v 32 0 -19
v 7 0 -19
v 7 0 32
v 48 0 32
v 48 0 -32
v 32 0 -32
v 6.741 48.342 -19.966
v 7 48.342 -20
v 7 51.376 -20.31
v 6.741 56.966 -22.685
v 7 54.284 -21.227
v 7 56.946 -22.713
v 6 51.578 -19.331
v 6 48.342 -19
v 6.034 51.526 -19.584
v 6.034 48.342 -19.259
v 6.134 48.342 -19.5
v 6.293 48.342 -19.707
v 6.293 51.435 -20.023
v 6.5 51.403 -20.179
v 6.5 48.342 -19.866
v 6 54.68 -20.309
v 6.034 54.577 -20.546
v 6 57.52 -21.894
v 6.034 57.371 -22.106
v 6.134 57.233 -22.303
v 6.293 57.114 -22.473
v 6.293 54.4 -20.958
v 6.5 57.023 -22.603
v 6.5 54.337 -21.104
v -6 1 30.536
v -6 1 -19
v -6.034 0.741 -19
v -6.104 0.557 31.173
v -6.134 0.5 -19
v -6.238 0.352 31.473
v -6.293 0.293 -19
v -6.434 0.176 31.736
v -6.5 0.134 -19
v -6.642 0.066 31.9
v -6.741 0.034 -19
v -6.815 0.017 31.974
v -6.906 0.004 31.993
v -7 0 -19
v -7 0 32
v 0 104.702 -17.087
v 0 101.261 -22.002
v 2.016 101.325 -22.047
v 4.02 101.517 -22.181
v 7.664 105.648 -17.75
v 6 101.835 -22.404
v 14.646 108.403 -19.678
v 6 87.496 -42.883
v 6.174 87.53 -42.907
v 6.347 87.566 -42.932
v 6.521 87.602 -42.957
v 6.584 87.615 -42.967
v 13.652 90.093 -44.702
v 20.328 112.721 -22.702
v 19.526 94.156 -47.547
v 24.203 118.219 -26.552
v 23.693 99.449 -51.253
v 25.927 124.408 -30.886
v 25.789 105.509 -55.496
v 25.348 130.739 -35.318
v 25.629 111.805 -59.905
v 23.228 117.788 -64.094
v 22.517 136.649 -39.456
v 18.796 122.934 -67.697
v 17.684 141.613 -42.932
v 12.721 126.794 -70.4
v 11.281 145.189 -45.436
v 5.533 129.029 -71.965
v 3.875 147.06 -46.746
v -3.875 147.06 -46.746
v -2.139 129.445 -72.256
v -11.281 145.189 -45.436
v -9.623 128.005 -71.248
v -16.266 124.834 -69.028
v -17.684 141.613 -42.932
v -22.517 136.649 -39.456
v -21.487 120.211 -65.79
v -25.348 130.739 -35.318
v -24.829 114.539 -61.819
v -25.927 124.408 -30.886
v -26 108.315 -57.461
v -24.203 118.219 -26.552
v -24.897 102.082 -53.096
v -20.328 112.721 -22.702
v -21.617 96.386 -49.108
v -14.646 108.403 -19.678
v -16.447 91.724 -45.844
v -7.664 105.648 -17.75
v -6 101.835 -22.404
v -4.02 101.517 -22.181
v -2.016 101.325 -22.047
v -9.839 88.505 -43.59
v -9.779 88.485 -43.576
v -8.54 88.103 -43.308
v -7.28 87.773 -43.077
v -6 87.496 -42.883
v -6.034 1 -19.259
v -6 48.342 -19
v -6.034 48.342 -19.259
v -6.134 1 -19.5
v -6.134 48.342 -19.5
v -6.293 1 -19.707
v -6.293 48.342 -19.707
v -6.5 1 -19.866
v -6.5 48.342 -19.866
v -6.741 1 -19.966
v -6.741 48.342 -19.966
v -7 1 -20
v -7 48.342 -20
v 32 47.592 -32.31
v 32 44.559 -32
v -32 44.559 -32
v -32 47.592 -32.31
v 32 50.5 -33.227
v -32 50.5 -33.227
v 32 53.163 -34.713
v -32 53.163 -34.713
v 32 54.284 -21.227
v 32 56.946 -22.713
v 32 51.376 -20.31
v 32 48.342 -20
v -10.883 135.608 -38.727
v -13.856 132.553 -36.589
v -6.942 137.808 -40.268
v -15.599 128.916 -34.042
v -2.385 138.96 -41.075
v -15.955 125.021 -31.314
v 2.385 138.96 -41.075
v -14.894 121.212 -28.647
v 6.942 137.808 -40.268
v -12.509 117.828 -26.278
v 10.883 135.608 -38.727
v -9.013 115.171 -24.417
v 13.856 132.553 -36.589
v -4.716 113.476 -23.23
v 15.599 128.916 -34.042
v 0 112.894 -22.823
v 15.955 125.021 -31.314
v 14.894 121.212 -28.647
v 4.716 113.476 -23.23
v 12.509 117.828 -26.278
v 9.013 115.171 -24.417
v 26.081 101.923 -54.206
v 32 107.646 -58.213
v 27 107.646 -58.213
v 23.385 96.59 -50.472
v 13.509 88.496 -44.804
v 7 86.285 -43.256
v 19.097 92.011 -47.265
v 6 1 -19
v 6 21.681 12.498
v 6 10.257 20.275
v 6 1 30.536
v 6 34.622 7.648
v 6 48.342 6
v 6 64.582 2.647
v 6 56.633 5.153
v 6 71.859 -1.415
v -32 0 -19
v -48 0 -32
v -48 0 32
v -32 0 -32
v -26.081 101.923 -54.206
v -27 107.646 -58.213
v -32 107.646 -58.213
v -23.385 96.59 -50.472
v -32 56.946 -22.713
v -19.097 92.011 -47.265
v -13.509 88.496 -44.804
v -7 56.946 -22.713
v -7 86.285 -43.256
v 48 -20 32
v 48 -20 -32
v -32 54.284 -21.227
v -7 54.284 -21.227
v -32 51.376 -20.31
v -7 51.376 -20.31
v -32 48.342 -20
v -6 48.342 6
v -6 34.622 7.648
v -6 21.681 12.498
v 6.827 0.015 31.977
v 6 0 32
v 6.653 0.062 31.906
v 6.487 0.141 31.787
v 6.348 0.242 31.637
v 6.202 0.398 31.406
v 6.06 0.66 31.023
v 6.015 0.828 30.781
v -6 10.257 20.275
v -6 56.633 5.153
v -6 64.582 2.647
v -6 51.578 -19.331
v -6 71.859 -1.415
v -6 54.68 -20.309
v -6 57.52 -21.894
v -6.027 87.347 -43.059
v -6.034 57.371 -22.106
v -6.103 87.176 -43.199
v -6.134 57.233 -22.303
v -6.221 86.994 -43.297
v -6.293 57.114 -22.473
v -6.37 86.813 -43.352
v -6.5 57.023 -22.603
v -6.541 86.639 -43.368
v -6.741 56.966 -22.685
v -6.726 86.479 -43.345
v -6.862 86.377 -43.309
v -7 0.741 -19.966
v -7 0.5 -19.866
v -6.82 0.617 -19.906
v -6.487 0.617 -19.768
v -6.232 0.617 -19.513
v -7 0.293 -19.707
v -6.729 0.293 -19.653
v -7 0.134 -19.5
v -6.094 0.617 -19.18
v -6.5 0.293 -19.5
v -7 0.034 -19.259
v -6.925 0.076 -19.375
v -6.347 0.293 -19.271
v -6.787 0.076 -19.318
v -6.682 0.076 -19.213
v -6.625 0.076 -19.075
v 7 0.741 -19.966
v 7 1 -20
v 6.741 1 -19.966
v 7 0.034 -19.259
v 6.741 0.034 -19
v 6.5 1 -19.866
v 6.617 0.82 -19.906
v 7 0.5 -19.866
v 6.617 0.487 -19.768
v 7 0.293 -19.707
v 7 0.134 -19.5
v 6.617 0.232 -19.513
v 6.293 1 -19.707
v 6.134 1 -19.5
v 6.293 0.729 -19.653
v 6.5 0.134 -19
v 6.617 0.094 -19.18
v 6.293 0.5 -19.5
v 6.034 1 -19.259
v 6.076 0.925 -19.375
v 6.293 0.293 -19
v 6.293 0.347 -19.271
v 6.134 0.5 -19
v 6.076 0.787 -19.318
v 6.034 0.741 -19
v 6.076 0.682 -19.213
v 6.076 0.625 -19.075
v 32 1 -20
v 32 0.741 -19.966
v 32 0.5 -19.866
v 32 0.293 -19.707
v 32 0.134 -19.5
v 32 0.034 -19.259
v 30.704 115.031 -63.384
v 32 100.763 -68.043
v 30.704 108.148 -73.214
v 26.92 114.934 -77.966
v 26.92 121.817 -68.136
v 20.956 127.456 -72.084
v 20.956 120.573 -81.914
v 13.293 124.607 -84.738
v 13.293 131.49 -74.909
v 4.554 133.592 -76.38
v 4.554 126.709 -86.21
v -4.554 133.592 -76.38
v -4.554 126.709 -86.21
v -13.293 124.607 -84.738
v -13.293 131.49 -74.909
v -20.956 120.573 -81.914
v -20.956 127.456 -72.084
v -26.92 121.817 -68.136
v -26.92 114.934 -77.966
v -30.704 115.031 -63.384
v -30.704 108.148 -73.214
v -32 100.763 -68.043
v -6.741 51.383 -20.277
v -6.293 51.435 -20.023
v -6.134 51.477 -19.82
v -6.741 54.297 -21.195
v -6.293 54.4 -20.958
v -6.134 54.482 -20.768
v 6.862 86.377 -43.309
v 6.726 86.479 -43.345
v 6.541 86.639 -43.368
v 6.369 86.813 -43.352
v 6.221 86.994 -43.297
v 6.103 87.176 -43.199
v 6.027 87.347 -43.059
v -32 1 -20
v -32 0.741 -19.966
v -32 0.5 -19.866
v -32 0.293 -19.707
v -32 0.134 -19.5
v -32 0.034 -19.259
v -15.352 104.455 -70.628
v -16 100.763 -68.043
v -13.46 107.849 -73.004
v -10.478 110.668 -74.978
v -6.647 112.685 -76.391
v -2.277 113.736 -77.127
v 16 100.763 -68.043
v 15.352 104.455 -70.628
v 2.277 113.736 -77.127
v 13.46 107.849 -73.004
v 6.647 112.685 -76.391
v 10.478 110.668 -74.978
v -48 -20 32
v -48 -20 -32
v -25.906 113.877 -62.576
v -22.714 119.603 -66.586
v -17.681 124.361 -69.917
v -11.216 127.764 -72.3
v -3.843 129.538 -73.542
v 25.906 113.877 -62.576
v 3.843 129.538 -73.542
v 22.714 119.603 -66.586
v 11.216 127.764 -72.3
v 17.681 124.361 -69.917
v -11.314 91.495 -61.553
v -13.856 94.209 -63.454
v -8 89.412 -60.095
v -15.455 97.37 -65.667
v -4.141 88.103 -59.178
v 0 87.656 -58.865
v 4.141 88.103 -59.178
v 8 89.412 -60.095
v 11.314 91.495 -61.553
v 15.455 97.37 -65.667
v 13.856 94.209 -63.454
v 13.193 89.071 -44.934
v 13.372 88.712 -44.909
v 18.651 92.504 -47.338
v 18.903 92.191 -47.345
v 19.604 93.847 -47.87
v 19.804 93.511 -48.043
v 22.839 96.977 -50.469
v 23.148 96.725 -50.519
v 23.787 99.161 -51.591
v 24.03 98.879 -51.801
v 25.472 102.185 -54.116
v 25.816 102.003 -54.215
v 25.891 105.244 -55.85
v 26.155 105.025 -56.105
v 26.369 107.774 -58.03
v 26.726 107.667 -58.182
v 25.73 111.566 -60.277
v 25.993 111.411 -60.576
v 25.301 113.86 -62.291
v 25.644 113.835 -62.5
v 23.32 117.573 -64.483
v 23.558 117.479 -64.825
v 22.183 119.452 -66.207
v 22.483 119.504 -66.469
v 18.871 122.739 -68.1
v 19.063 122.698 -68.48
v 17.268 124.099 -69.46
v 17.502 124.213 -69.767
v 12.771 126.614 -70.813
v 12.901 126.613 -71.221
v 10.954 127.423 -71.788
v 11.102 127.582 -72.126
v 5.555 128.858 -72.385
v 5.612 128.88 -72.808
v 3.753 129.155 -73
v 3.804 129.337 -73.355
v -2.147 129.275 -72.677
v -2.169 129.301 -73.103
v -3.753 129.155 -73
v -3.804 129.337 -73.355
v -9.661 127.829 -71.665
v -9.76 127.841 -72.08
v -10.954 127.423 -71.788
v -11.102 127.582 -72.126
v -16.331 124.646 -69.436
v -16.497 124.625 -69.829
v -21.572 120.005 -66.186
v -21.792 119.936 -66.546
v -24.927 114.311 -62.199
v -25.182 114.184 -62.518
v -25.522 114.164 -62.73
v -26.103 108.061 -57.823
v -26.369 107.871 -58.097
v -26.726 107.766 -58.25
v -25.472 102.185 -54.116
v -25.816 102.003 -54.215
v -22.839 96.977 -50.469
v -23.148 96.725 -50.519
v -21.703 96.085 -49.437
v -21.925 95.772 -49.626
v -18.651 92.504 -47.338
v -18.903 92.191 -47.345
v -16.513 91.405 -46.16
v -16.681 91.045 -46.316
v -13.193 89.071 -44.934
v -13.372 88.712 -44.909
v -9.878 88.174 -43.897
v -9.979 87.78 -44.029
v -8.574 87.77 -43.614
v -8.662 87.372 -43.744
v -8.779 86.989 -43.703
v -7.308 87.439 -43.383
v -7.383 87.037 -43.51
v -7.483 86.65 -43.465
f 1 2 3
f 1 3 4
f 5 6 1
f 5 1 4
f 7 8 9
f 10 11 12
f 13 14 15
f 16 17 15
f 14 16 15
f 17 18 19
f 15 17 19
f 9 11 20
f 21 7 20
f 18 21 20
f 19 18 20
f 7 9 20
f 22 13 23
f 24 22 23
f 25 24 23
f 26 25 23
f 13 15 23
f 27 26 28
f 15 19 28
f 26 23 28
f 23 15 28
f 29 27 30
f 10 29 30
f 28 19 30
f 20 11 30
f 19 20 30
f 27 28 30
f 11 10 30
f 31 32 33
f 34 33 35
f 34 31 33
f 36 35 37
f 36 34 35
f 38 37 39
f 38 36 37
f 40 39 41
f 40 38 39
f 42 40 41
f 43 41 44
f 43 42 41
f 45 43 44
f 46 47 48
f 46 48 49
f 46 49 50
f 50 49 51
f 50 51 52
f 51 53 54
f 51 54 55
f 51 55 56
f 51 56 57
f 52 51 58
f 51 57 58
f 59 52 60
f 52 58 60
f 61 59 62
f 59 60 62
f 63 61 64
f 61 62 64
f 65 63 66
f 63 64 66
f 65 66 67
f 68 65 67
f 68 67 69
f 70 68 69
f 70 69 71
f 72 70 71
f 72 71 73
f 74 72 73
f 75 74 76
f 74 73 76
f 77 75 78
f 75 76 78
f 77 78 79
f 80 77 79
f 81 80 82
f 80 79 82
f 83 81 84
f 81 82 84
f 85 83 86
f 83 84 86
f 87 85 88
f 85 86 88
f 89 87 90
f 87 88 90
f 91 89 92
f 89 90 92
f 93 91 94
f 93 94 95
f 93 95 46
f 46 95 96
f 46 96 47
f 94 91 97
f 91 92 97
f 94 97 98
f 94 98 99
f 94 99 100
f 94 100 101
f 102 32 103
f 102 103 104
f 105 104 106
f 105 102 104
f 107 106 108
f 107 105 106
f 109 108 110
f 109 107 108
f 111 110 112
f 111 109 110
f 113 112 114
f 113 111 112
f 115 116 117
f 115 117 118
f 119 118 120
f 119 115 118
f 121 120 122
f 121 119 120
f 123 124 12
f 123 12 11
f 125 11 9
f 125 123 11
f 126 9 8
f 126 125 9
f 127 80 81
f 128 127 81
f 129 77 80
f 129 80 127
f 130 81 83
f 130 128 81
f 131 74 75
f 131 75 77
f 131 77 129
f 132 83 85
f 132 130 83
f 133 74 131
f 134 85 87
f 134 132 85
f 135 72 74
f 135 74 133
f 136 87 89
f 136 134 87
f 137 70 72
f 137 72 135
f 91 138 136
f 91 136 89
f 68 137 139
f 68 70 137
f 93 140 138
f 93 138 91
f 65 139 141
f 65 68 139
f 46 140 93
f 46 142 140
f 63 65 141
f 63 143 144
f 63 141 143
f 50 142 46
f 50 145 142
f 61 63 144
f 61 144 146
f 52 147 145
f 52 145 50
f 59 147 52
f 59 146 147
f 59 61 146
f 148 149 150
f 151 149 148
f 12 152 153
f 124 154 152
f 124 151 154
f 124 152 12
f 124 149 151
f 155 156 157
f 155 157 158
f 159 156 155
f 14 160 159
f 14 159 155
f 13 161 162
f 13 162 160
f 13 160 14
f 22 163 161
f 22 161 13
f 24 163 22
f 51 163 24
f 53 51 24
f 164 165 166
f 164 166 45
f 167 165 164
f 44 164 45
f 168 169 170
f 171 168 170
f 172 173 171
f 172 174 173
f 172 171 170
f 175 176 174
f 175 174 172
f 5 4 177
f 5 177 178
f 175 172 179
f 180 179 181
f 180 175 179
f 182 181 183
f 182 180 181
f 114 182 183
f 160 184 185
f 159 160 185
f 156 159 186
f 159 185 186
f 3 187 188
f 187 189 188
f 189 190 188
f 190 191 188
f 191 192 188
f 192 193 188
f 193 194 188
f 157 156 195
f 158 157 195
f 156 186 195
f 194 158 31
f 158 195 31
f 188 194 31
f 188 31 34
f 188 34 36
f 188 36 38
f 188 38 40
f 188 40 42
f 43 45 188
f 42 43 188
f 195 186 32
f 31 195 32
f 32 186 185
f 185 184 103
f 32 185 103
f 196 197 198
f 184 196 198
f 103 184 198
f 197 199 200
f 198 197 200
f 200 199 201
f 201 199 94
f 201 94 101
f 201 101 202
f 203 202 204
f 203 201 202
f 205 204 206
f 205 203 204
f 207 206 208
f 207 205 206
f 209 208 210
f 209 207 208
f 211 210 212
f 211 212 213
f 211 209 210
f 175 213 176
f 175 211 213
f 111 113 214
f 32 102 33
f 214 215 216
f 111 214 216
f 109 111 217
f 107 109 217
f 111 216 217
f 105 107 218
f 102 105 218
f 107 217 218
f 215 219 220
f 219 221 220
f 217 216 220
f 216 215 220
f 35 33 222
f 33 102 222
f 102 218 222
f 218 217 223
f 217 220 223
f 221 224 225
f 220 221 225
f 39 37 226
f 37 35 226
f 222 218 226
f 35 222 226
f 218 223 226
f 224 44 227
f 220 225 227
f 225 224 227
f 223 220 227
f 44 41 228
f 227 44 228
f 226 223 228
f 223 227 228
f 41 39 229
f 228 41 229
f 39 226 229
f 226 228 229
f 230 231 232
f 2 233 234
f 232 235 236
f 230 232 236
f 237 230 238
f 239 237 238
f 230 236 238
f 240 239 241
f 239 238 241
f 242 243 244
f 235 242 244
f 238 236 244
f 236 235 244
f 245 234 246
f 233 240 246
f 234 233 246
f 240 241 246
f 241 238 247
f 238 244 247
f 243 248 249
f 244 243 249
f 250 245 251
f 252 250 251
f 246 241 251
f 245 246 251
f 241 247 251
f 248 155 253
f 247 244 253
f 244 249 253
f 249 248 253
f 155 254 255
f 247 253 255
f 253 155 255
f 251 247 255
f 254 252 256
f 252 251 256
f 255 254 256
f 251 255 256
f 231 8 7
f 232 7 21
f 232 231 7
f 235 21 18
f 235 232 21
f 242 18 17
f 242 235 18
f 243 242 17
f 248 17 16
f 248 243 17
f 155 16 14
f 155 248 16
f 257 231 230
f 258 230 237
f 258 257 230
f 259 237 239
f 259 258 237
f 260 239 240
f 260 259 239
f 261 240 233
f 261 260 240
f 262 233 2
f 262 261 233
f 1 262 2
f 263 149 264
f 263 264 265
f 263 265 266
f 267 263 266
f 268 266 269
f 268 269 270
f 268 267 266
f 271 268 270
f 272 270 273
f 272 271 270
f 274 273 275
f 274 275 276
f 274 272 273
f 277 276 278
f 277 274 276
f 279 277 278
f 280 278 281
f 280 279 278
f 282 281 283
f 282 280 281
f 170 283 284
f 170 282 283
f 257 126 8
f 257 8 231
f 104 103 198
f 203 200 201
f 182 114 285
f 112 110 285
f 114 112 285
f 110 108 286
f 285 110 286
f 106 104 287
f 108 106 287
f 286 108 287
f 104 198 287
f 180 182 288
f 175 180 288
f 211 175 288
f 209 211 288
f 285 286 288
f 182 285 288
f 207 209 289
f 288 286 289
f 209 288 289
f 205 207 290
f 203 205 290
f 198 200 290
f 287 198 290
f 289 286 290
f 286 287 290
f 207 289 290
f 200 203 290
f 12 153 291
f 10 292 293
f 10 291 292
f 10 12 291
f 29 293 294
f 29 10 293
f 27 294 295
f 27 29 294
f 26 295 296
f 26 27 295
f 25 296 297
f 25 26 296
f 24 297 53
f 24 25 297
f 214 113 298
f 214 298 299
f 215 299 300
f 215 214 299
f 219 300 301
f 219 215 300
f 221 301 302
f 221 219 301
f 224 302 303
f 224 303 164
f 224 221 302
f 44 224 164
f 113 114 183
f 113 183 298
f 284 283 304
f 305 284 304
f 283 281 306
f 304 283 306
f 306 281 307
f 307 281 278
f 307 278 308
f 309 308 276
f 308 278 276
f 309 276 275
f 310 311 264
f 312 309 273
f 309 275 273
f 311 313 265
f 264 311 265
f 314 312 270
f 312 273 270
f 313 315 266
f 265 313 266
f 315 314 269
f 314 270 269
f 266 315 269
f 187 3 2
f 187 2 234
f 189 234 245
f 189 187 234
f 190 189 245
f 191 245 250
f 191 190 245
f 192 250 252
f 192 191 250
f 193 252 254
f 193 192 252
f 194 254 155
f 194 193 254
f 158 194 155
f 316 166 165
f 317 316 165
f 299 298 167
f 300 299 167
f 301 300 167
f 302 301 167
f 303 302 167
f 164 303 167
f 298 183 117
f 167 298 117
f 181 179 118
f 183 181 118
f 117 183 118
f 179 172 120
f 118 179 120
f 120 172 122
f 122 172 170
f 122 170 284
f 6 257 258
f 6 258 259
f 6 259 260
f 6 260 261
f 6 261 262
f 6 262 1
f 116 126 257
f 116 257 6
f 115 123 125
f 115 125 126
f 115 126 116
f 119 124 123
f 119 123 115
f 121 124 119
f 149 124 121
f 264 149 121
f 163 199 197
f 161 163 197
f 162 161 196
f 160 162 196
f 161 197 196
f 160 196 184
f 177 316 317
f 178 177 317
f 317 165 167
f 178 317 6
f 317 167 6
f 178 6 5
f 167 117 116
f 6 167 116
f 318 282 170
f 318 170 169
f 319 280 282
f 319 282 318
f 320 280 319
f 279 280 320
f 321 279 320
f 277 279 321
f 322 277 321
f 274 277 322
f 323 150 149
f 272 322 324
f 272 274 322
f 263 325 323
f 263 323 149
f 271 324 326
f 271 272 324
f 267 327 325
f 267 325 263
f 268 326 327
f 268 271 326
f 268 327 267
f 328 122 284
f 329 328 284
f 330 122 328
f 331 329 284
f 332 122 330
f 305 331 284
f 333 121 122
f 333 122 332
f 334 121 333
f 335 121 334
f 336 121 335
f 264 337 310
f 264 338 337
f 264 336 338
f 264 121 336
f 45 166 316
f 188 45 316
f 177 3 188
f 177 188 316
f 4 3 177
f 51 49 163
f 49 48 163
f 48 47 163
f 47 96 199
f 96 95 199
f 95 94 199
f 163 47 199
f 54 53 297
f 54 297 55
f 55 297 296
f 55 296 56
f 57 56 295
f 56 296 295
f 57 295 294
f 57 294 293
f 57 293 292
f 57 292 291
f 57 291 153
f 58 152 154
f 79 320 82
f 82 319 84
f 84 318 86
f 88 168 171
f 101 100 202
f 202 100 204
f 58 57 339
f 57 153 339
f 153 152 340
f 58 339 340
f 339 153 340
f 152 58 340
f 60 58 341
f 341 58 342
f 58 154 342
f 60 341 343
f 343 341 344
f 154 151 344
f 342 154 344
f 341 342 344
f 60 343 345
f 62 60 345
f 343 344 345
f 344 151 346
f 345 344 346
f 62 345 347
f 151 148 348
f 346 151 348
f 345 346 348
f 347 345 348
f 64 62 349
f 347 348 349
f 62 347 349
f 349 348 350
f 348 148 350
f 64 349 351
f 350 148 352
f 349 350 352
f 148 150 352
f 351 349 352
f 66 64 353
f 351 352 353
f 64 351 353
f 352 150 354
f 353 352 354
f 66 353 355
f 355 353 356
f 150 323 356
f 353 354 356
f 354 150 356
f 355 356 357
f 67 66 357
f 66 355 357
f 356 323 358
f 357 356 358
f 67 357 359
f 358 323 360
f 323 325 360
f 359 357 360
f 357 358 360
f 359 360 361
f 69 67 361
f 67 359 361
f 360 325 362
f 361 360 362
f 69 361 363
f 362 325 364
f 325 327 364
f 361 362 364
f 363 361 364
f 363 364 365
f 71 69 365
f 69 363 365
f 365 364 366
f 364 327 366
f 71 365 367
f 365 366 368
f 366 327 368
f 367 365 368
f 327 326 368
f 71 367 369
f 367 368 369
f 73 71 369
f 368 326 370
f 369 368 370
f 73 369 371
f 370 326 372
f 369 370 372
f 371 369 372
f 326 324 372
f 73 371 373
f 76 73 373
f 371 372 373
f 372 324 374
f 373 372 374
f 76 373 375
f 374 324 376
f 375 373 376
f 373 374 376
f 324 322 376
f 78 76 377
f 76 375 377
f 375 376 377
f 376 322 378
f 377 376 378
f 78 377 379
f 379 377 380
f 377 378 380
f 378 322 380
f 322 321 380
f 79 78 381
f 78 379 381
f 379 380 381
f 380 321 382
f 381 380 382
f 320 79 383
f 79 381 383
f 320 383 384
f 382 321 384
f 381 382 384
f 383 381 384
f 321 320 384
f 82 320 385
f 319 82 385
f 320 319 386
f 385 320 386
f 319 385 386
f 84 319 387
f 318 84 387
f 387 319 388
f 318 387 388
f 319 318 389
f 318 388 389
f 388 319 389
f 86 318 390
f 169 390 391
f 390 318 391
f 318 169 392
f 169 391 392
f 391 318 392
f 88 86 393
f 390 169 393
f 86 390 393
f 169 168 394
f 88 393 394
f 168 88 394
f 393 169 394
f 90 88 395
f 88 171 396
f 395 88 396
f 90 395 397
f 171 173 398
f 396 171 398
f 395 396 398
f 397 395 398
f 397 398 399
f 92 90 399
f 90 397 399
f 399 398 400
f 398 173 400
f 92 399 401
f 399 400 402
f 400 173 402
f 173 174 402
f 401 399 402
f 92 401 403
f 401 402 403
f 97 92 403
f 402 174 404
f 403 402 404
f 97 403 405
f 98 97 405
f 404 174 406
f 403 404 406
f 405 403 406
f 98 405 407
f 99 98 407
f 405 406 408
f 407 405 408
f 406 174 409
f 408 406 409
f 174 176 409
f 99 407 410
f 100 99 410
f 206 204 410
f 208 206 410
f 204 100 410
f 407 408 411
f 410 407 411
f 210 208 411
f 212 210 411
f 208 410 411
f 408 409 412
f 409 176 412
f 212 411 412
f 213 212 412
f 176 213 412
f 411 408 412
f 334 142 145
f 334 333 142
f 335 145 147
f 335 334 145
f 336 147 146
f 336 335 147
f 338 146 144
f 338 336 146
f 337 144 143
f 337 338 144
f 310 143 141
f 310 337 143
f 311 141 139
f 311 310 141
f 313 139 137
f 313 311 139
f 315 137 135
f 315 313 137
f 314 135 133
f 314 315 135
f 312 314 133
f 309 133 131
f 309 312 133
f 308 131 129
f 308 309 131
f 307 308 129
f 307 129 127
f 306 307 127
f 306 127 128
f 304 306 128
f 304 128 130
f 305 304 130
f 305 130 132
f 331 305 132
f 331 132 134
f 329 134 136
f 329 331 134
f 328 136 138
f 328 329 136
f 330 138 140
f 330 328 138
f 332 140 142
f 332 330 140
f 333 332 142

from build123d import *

# Parameters (mm, degrees)
SKETCH1_W               = 96
SKETCH1_H               = 64
BOSS_EXTRUDE1_DEPTH     = 20
BOSS_EXTRUDE2_DEPTH     = 32
BOSS_EXTRUDE3_DEPTH     = 12
SKETCH8_R               = 26
SKETCH8_R_2             = 16
BOSS_EXTRUDE4_DEPTH     = 32
CUT_EXTRUDE1_DEPTH      = 177.853582377
CUT_EXTRUDE1_DEPTH_BACK = 177.853582377
SKETCH9_R               = 16
RIB9_START              = -6
RIB9_DEPTH              = 12
FILLET1_R               = 1


with BuildPart() as part:
    # Sketch1 → Boss-Extrude1 (new body)
    with BuildSketch(Plane(origin=(0, 0, 0), x_dir=(1, 0, 0), z_dir=(0, 1, 0))):
        Rectangle(SKETCH1_W, SKETCH1_H)
    extrude(amount=-BOSS_EXTRUDE1_DEPTH)

    # Sketch4 → Boss-Extrude2 (add, symmetric)
    with BuildSketch(Plane(origin=(0, 0, 0), x_dir=(0, 0, -1), z_dir=(1, 0, 0))):
        with BuildLine():
            Line((20, -20), (32, -20))
            Line((32, -20), (32, 44.558859159))
            ThreePointArc((32, 44.558859159), (32.694245739, 49.069446152), (34.712719336, 53.162505705))
            Line((34.712719336, 53.162505705), (68.042689949, 100.762636801))
            Line((68.042689949, 100.762636801), (58.212865417, 107.645554037))
            Line((58.212865417, 107.645554037), (22.712719336, 56.946091171))
            ThreePointArc((22.712719336, 56.946091171), (20.694245739, 52.853031619), (20, 48.342444626))
            Line((20, 48.342444626), (20, -20))
        make_face()
    extrude(amount=BOSS_EXTRUDE2_DEPTH, both=True)

    # Sketch6 → Boss-Extrude3 (add)
    with BuildSketch(Plane(origin=(0, 8.063203075, 11.515447399), x_dir=(1, 0, 0), z_dir=(0, 0.573576436351053, 0.819152044288987))):
        with BuildLine():
            Line((-32, 121.567603544), (32, 121.567603544))
            ThreePointArc((32, 121.567603544), (0, 153.567603544), (-32, 121.567603544))
        make_face()
    extrude(amount=-BOSS_EXTRUDE3_DEPTH)

    # Sketch8 → Boss-Extrude4 (add)
    with BuildSketch(Plane(origin=(0, 8.063203075, 11.515447399), x_dir=(1, 0, 0), z_dir=(0, 0.573576436351053, 0.819152044288987))):
        with Locations(Location((0, 121.567603544, 0), (0, 0, 270))):
            Circle(SKETCH8_R)
        with Locations(Location((0, 121.567603544, 0), (0, 0, 270))):
            Circle(SKETCH8_R_2, mode=Mode.SUBTRACT)
    extrude(amount=BOSS_EXTRUDE4_DEPTH)

    # Sketch9 → Cut-Extrude1 (cut, two sides: drawn at the far end of the back side and taken through both)
    with BuildSketch(Plane(origin=(0, 8.063203075, 11.515447399), x_dir=(1, 0, 0), z_dir=(0, 0.573576436351053, 0.819152044288987)).offset(-CUT_EXTRUDE1_DEPTH_BACK)):
        with Locations(Location((0, 121.567603544, 0), (0, 0, 270))):
            Circle(SKETCH9_R)
    extrude(amount=CUT_EXTRUDE1_DEPTH + CUT_EXTRUDE1_DEPTH_BACK, mode=Mode.SUBTRACT)

    # Rib9: read off the stored shape, not the designer's step
    # Rib9 outline → Rib9 (add)
    with BuildSketch(Plane(origin=(0, 0, 0), x_dir=(0, 0, -1), z_dir=(1, 0, 0)).offset(RIB9_START)):
        with BuildLine():
            Line((22.712719336, 56.946091171), (43.702401809, 86.922464357))
            Line((43.702401809, 86.922464357), (22.404448657, 101.835451702))
            Line((22.404448657, 101.835451702), (1.414766184, 71.859078516))
            ThreePointArc((1.414766184, 71.859078516), (-4.102394981, 60.671382406), (-6, 48.342444626))
            ThreePointArc((-6, 48.342444626), (-12.91230776, 20.897080936), (-32, 0))
            Line((-32, 0), (20, 0))
            Line((20, 0), (20, 48.342444626))
            ThreePointArc((20, 48.342444626), (20.694245739, 52.853031619), (22.712719336, 56.946091171))
        make_face()
    extrude(amount=RIB9_DEPTH)

    # Fillet1
    # the kernel refuses this fillet: 1 mm, written as the material it adds along each edge
    with BuildSketch(Plane(origin=(-7, 1, -19), x_dir=(1, 0, 0), z_dir=(0, -1, 0))) as fillet1_piece_1_section:
        Polygon((0, 0), (FILLET1_R * 1.02, 0), (FILLET1_R * 1.02, -FILLET1_R * 1.02), (0, -FILLET1_R * 1.02), align=None)
    fillet1_piece_1 = extrude(amount=FILLET1_R * 1.02, mode=Mode.PRIVATE)
    fillet1_piece_1 = fillet1_piece_1 - Plane(origin=(-7, 1, -19), x_dir=(-0.7071067811865475, 0, 0.7071067811865475), z_dir=(0, -1, 0)) * Sphere(FILLET1_R, mode=Mode.PRIVATE)
    add(fillet1_piece_1)
    with BuildSketch(Plane(origin=(7, 1, -19), x_dir=(0, 0, -1), z_dir=(-1, 0, 0))) as fillet1_piece_2_section:
        Polygon((0, 0), (FILLET1_R * 1.02, 0), (FILLET1_R * 1.02, FILLET1_R * 1.02), (0, FILLET1_R * 1.02), align=None)
    fillet1_piece_2 = extrude(amount=FILLET1_R * 1.02, mode=Mode.PRIVATE)
    fillet1_piece_2 = fillet1_piece_2 - Plane(origin=(7, 1, -19), x_dir=(0, 0.7071067811865475, 0.7071067811865476), z_dir=(-1, 0, 0)) * Sphere(FILLET1_R, mode=Mode.PRIVATE)
    add(fillet1_piece_2)
    with BuildSketch(Plane(origin=(-6, 0, 34.5), x_dir=(-1, 0, 0), z_dir=(0, 0, -1))) as fillet1_piece_3_section:
        with BuildLine():
            CenterArc((FILLET1_R, FILLET1_R), FILLET1_R, 180, 90)
            Line((0, FILLET1_R), (0, 0))
            Line((0, 0), (FILLET1_R, 0))
        make_face()
    fillet1_piece_3 = extrude(amount=53.5, mode=Mode.PRIVATE)
    fillet1_piece_3 = fillet1_piece_3 - Plane(origin=(-6, 48.342444627, 63.942152933), x_dir=(0, -1.6764948068756696e-11, -1.0), z_dir=(-1, 0, 0)) * Cylinder(57.942152933, 111, mode=Mode.PRIVATE)
    add(fillet1_piece_3)
    with BuildSketch(Plane(origin=(-6, 1, -20), x_dir=(0, 0, 1), z_dir=(0, 1, 0)), Plane(origin=(6, 1, -20), x_dir=(1, 0, 0), z_dir=(0, 1, 0))) as fillet1_piece_4:
        with BuildLine():
            CenterArc((FILLET1_R, -FILLET1_R), FILLET1_R, 90, 90)
            Line((0, -FILLET1_R), (0, 0))
            Line((0, 0), (FILLET1_R, 0))
        make_face()
    extrude(amount=47.342444626)
    with BuildSketch(Plane(origin=(-6, 48.342444626, -34.999999997), x_dir=(0, -1.1790272464341429e-11, 1.0), z_dir=(0, -1.0, -1.1790272464341429e-11))) as fillet1_piece_5:
        with BuildLine():
            CenterArc((14.999999997 + FILLET1_R, FILLET1_R), FILLET1_R, 180, 90)
            Line((14.999999997, FILLET1_R), (14.999999997, 0))
            Line((14.999999997, 0), (14.999999997 + FILLET1_R, 0))
        make_face()
    revolve(axis=Axis((-6, 48.342444626, -34.999999997), (-1, 0, 0)), revolution_arc=35.000000006)
    with BuildSketch(Plane(origin=(-6, 56.946091171, -22.712719336), x_dir=(0, 0.5735764363505949, 0.8191520442893078), z_dir=(0, 0.8191520442893078, -0.5735764363505949))) as fillet1_piece_6:
        with BuildLine():
            CenterArc((FILLET1_R, -FILLET1_R), FILLET1_R, 90, 90)
            Line((FILLET1_R * 4.36944609845e-10, -FILLET1_R), (0, 0))
            Line((0, 0), (FILLET1_R, 0))
        make_face()
    extrude(amount=39.09439465)
    with BuildSketch(Plane(origin=(-7, 0, -20), x_dir=(0, 0, 1), z_dir=(-1, 0, 0)), Plane(origin=(32, 0, -20), x_dir=(0, 0, 1), z_dir=(-1, 0, 0))) as fillet1_piece_7:
        with BuildLine():
            CenterArc((FILLET1_R, FILLET1_R), FILLET1_R, 180, 90)
            Line((0, FILLET1_R), (0, 0))
            Line((0, 0), (FILLET1_R, 0))
        make_face()
    extrude(amount=25)
    with BuildSketch(Plane(origin=(0, 107.645554037, -58.212865417), x_dir=(0.13576209912183695, -0.8115678972317177, 0.5682659594106623), z_dir=(-0.990741465995056, -0.11120980103261684, 0.07786994100584167))) as fillet1_piece_8:
        with BuildLine():
            CenterArc((26 + FILLET1_R, FILLET1_R), FILLET1_R, 180, 90)
            Line((26, FILLET1_R), (26, 0))
            Line((26, 0), (26 + FILLET1_R, 0))
        make_face()
    revolve(axis=Axis((0, 107.645554037, -58.212865417), (0, 0.573576436351053, 0.819152044288987)), revolution_arc=344.394618628)
    with BuildSketch(Plane(origin=(6, 0, 34.5), x_dir=(1, 0, 0), z_dir=(0, 0, -1))) as fillet1_piece_9_section:
        with BuildLine():
            CenterArc((FILLET1_R, -FILLET1_R), FILLET1_R, 90, 90)
            Line((0, -FILLET1_R), (0, 0))
            Line((0, 0), (FILLET1_R, 0))
        make_face()
    fillet1_piece_9 = extrude(amount=53.5, mode=Mode.PRIVATE)
    fillet1_piece_9 = fillet1_piece_9 - Plane(origin=(6, 48.342444627, 63.942152933), x_dir=(0, -1.6764948068756696e-11, -1.0), z_dir=(-1, 0, 0)) * Cylinder(57.942152933, 111, mode=Mode.PRIVATE)
    add(fillet1_piece_9)
    with BuildSketch(Plane(origin=(6, 48.342444626, -34.999999997), x_dir=(0, -1.1790272464341429e-11, 1.0), z_dir=(0, -1.0, -1.1790272464341429e-11))) as fillet1_piece_10:
        with BuildLine():
            CenterArc((14.999999997 + FILLET1_R, -FILLET1_R), FILLET1_R, 90, 90)
            Line((14.999999997, -FILLET1_R), (14.999999997, 0))
            Line((14.999999997, 0), (14.999999997 + FILLET1_R, 0))
        make_face()
    revolve(axis=Axis((6, 48.342444626, -34.999999997), (-1, 0, 0)), revolution_arc=35.000000006)
    with BuildSketch(Plane(origin=(6, 56.946091171, -22.712719336), x_dir=(0, 0.5735764363505949, 0.8191520442893078), z_dir=(0, 0.8191520442893078, -0.5735764363505949))) as fillet1_piece_11:
        with BuildLine():
            CenterArc((FILLET1_R, FILLET1_R), FILLET1_R, 180, 90)
            Line((FILLET1_R * 4.36944609845e-10, FILLET1_R), (0, 0))
            Line((0, 0), (FILLET1_R, 0))
        make_face()
    extrude(amount=39.09439465)


solid = part.part
